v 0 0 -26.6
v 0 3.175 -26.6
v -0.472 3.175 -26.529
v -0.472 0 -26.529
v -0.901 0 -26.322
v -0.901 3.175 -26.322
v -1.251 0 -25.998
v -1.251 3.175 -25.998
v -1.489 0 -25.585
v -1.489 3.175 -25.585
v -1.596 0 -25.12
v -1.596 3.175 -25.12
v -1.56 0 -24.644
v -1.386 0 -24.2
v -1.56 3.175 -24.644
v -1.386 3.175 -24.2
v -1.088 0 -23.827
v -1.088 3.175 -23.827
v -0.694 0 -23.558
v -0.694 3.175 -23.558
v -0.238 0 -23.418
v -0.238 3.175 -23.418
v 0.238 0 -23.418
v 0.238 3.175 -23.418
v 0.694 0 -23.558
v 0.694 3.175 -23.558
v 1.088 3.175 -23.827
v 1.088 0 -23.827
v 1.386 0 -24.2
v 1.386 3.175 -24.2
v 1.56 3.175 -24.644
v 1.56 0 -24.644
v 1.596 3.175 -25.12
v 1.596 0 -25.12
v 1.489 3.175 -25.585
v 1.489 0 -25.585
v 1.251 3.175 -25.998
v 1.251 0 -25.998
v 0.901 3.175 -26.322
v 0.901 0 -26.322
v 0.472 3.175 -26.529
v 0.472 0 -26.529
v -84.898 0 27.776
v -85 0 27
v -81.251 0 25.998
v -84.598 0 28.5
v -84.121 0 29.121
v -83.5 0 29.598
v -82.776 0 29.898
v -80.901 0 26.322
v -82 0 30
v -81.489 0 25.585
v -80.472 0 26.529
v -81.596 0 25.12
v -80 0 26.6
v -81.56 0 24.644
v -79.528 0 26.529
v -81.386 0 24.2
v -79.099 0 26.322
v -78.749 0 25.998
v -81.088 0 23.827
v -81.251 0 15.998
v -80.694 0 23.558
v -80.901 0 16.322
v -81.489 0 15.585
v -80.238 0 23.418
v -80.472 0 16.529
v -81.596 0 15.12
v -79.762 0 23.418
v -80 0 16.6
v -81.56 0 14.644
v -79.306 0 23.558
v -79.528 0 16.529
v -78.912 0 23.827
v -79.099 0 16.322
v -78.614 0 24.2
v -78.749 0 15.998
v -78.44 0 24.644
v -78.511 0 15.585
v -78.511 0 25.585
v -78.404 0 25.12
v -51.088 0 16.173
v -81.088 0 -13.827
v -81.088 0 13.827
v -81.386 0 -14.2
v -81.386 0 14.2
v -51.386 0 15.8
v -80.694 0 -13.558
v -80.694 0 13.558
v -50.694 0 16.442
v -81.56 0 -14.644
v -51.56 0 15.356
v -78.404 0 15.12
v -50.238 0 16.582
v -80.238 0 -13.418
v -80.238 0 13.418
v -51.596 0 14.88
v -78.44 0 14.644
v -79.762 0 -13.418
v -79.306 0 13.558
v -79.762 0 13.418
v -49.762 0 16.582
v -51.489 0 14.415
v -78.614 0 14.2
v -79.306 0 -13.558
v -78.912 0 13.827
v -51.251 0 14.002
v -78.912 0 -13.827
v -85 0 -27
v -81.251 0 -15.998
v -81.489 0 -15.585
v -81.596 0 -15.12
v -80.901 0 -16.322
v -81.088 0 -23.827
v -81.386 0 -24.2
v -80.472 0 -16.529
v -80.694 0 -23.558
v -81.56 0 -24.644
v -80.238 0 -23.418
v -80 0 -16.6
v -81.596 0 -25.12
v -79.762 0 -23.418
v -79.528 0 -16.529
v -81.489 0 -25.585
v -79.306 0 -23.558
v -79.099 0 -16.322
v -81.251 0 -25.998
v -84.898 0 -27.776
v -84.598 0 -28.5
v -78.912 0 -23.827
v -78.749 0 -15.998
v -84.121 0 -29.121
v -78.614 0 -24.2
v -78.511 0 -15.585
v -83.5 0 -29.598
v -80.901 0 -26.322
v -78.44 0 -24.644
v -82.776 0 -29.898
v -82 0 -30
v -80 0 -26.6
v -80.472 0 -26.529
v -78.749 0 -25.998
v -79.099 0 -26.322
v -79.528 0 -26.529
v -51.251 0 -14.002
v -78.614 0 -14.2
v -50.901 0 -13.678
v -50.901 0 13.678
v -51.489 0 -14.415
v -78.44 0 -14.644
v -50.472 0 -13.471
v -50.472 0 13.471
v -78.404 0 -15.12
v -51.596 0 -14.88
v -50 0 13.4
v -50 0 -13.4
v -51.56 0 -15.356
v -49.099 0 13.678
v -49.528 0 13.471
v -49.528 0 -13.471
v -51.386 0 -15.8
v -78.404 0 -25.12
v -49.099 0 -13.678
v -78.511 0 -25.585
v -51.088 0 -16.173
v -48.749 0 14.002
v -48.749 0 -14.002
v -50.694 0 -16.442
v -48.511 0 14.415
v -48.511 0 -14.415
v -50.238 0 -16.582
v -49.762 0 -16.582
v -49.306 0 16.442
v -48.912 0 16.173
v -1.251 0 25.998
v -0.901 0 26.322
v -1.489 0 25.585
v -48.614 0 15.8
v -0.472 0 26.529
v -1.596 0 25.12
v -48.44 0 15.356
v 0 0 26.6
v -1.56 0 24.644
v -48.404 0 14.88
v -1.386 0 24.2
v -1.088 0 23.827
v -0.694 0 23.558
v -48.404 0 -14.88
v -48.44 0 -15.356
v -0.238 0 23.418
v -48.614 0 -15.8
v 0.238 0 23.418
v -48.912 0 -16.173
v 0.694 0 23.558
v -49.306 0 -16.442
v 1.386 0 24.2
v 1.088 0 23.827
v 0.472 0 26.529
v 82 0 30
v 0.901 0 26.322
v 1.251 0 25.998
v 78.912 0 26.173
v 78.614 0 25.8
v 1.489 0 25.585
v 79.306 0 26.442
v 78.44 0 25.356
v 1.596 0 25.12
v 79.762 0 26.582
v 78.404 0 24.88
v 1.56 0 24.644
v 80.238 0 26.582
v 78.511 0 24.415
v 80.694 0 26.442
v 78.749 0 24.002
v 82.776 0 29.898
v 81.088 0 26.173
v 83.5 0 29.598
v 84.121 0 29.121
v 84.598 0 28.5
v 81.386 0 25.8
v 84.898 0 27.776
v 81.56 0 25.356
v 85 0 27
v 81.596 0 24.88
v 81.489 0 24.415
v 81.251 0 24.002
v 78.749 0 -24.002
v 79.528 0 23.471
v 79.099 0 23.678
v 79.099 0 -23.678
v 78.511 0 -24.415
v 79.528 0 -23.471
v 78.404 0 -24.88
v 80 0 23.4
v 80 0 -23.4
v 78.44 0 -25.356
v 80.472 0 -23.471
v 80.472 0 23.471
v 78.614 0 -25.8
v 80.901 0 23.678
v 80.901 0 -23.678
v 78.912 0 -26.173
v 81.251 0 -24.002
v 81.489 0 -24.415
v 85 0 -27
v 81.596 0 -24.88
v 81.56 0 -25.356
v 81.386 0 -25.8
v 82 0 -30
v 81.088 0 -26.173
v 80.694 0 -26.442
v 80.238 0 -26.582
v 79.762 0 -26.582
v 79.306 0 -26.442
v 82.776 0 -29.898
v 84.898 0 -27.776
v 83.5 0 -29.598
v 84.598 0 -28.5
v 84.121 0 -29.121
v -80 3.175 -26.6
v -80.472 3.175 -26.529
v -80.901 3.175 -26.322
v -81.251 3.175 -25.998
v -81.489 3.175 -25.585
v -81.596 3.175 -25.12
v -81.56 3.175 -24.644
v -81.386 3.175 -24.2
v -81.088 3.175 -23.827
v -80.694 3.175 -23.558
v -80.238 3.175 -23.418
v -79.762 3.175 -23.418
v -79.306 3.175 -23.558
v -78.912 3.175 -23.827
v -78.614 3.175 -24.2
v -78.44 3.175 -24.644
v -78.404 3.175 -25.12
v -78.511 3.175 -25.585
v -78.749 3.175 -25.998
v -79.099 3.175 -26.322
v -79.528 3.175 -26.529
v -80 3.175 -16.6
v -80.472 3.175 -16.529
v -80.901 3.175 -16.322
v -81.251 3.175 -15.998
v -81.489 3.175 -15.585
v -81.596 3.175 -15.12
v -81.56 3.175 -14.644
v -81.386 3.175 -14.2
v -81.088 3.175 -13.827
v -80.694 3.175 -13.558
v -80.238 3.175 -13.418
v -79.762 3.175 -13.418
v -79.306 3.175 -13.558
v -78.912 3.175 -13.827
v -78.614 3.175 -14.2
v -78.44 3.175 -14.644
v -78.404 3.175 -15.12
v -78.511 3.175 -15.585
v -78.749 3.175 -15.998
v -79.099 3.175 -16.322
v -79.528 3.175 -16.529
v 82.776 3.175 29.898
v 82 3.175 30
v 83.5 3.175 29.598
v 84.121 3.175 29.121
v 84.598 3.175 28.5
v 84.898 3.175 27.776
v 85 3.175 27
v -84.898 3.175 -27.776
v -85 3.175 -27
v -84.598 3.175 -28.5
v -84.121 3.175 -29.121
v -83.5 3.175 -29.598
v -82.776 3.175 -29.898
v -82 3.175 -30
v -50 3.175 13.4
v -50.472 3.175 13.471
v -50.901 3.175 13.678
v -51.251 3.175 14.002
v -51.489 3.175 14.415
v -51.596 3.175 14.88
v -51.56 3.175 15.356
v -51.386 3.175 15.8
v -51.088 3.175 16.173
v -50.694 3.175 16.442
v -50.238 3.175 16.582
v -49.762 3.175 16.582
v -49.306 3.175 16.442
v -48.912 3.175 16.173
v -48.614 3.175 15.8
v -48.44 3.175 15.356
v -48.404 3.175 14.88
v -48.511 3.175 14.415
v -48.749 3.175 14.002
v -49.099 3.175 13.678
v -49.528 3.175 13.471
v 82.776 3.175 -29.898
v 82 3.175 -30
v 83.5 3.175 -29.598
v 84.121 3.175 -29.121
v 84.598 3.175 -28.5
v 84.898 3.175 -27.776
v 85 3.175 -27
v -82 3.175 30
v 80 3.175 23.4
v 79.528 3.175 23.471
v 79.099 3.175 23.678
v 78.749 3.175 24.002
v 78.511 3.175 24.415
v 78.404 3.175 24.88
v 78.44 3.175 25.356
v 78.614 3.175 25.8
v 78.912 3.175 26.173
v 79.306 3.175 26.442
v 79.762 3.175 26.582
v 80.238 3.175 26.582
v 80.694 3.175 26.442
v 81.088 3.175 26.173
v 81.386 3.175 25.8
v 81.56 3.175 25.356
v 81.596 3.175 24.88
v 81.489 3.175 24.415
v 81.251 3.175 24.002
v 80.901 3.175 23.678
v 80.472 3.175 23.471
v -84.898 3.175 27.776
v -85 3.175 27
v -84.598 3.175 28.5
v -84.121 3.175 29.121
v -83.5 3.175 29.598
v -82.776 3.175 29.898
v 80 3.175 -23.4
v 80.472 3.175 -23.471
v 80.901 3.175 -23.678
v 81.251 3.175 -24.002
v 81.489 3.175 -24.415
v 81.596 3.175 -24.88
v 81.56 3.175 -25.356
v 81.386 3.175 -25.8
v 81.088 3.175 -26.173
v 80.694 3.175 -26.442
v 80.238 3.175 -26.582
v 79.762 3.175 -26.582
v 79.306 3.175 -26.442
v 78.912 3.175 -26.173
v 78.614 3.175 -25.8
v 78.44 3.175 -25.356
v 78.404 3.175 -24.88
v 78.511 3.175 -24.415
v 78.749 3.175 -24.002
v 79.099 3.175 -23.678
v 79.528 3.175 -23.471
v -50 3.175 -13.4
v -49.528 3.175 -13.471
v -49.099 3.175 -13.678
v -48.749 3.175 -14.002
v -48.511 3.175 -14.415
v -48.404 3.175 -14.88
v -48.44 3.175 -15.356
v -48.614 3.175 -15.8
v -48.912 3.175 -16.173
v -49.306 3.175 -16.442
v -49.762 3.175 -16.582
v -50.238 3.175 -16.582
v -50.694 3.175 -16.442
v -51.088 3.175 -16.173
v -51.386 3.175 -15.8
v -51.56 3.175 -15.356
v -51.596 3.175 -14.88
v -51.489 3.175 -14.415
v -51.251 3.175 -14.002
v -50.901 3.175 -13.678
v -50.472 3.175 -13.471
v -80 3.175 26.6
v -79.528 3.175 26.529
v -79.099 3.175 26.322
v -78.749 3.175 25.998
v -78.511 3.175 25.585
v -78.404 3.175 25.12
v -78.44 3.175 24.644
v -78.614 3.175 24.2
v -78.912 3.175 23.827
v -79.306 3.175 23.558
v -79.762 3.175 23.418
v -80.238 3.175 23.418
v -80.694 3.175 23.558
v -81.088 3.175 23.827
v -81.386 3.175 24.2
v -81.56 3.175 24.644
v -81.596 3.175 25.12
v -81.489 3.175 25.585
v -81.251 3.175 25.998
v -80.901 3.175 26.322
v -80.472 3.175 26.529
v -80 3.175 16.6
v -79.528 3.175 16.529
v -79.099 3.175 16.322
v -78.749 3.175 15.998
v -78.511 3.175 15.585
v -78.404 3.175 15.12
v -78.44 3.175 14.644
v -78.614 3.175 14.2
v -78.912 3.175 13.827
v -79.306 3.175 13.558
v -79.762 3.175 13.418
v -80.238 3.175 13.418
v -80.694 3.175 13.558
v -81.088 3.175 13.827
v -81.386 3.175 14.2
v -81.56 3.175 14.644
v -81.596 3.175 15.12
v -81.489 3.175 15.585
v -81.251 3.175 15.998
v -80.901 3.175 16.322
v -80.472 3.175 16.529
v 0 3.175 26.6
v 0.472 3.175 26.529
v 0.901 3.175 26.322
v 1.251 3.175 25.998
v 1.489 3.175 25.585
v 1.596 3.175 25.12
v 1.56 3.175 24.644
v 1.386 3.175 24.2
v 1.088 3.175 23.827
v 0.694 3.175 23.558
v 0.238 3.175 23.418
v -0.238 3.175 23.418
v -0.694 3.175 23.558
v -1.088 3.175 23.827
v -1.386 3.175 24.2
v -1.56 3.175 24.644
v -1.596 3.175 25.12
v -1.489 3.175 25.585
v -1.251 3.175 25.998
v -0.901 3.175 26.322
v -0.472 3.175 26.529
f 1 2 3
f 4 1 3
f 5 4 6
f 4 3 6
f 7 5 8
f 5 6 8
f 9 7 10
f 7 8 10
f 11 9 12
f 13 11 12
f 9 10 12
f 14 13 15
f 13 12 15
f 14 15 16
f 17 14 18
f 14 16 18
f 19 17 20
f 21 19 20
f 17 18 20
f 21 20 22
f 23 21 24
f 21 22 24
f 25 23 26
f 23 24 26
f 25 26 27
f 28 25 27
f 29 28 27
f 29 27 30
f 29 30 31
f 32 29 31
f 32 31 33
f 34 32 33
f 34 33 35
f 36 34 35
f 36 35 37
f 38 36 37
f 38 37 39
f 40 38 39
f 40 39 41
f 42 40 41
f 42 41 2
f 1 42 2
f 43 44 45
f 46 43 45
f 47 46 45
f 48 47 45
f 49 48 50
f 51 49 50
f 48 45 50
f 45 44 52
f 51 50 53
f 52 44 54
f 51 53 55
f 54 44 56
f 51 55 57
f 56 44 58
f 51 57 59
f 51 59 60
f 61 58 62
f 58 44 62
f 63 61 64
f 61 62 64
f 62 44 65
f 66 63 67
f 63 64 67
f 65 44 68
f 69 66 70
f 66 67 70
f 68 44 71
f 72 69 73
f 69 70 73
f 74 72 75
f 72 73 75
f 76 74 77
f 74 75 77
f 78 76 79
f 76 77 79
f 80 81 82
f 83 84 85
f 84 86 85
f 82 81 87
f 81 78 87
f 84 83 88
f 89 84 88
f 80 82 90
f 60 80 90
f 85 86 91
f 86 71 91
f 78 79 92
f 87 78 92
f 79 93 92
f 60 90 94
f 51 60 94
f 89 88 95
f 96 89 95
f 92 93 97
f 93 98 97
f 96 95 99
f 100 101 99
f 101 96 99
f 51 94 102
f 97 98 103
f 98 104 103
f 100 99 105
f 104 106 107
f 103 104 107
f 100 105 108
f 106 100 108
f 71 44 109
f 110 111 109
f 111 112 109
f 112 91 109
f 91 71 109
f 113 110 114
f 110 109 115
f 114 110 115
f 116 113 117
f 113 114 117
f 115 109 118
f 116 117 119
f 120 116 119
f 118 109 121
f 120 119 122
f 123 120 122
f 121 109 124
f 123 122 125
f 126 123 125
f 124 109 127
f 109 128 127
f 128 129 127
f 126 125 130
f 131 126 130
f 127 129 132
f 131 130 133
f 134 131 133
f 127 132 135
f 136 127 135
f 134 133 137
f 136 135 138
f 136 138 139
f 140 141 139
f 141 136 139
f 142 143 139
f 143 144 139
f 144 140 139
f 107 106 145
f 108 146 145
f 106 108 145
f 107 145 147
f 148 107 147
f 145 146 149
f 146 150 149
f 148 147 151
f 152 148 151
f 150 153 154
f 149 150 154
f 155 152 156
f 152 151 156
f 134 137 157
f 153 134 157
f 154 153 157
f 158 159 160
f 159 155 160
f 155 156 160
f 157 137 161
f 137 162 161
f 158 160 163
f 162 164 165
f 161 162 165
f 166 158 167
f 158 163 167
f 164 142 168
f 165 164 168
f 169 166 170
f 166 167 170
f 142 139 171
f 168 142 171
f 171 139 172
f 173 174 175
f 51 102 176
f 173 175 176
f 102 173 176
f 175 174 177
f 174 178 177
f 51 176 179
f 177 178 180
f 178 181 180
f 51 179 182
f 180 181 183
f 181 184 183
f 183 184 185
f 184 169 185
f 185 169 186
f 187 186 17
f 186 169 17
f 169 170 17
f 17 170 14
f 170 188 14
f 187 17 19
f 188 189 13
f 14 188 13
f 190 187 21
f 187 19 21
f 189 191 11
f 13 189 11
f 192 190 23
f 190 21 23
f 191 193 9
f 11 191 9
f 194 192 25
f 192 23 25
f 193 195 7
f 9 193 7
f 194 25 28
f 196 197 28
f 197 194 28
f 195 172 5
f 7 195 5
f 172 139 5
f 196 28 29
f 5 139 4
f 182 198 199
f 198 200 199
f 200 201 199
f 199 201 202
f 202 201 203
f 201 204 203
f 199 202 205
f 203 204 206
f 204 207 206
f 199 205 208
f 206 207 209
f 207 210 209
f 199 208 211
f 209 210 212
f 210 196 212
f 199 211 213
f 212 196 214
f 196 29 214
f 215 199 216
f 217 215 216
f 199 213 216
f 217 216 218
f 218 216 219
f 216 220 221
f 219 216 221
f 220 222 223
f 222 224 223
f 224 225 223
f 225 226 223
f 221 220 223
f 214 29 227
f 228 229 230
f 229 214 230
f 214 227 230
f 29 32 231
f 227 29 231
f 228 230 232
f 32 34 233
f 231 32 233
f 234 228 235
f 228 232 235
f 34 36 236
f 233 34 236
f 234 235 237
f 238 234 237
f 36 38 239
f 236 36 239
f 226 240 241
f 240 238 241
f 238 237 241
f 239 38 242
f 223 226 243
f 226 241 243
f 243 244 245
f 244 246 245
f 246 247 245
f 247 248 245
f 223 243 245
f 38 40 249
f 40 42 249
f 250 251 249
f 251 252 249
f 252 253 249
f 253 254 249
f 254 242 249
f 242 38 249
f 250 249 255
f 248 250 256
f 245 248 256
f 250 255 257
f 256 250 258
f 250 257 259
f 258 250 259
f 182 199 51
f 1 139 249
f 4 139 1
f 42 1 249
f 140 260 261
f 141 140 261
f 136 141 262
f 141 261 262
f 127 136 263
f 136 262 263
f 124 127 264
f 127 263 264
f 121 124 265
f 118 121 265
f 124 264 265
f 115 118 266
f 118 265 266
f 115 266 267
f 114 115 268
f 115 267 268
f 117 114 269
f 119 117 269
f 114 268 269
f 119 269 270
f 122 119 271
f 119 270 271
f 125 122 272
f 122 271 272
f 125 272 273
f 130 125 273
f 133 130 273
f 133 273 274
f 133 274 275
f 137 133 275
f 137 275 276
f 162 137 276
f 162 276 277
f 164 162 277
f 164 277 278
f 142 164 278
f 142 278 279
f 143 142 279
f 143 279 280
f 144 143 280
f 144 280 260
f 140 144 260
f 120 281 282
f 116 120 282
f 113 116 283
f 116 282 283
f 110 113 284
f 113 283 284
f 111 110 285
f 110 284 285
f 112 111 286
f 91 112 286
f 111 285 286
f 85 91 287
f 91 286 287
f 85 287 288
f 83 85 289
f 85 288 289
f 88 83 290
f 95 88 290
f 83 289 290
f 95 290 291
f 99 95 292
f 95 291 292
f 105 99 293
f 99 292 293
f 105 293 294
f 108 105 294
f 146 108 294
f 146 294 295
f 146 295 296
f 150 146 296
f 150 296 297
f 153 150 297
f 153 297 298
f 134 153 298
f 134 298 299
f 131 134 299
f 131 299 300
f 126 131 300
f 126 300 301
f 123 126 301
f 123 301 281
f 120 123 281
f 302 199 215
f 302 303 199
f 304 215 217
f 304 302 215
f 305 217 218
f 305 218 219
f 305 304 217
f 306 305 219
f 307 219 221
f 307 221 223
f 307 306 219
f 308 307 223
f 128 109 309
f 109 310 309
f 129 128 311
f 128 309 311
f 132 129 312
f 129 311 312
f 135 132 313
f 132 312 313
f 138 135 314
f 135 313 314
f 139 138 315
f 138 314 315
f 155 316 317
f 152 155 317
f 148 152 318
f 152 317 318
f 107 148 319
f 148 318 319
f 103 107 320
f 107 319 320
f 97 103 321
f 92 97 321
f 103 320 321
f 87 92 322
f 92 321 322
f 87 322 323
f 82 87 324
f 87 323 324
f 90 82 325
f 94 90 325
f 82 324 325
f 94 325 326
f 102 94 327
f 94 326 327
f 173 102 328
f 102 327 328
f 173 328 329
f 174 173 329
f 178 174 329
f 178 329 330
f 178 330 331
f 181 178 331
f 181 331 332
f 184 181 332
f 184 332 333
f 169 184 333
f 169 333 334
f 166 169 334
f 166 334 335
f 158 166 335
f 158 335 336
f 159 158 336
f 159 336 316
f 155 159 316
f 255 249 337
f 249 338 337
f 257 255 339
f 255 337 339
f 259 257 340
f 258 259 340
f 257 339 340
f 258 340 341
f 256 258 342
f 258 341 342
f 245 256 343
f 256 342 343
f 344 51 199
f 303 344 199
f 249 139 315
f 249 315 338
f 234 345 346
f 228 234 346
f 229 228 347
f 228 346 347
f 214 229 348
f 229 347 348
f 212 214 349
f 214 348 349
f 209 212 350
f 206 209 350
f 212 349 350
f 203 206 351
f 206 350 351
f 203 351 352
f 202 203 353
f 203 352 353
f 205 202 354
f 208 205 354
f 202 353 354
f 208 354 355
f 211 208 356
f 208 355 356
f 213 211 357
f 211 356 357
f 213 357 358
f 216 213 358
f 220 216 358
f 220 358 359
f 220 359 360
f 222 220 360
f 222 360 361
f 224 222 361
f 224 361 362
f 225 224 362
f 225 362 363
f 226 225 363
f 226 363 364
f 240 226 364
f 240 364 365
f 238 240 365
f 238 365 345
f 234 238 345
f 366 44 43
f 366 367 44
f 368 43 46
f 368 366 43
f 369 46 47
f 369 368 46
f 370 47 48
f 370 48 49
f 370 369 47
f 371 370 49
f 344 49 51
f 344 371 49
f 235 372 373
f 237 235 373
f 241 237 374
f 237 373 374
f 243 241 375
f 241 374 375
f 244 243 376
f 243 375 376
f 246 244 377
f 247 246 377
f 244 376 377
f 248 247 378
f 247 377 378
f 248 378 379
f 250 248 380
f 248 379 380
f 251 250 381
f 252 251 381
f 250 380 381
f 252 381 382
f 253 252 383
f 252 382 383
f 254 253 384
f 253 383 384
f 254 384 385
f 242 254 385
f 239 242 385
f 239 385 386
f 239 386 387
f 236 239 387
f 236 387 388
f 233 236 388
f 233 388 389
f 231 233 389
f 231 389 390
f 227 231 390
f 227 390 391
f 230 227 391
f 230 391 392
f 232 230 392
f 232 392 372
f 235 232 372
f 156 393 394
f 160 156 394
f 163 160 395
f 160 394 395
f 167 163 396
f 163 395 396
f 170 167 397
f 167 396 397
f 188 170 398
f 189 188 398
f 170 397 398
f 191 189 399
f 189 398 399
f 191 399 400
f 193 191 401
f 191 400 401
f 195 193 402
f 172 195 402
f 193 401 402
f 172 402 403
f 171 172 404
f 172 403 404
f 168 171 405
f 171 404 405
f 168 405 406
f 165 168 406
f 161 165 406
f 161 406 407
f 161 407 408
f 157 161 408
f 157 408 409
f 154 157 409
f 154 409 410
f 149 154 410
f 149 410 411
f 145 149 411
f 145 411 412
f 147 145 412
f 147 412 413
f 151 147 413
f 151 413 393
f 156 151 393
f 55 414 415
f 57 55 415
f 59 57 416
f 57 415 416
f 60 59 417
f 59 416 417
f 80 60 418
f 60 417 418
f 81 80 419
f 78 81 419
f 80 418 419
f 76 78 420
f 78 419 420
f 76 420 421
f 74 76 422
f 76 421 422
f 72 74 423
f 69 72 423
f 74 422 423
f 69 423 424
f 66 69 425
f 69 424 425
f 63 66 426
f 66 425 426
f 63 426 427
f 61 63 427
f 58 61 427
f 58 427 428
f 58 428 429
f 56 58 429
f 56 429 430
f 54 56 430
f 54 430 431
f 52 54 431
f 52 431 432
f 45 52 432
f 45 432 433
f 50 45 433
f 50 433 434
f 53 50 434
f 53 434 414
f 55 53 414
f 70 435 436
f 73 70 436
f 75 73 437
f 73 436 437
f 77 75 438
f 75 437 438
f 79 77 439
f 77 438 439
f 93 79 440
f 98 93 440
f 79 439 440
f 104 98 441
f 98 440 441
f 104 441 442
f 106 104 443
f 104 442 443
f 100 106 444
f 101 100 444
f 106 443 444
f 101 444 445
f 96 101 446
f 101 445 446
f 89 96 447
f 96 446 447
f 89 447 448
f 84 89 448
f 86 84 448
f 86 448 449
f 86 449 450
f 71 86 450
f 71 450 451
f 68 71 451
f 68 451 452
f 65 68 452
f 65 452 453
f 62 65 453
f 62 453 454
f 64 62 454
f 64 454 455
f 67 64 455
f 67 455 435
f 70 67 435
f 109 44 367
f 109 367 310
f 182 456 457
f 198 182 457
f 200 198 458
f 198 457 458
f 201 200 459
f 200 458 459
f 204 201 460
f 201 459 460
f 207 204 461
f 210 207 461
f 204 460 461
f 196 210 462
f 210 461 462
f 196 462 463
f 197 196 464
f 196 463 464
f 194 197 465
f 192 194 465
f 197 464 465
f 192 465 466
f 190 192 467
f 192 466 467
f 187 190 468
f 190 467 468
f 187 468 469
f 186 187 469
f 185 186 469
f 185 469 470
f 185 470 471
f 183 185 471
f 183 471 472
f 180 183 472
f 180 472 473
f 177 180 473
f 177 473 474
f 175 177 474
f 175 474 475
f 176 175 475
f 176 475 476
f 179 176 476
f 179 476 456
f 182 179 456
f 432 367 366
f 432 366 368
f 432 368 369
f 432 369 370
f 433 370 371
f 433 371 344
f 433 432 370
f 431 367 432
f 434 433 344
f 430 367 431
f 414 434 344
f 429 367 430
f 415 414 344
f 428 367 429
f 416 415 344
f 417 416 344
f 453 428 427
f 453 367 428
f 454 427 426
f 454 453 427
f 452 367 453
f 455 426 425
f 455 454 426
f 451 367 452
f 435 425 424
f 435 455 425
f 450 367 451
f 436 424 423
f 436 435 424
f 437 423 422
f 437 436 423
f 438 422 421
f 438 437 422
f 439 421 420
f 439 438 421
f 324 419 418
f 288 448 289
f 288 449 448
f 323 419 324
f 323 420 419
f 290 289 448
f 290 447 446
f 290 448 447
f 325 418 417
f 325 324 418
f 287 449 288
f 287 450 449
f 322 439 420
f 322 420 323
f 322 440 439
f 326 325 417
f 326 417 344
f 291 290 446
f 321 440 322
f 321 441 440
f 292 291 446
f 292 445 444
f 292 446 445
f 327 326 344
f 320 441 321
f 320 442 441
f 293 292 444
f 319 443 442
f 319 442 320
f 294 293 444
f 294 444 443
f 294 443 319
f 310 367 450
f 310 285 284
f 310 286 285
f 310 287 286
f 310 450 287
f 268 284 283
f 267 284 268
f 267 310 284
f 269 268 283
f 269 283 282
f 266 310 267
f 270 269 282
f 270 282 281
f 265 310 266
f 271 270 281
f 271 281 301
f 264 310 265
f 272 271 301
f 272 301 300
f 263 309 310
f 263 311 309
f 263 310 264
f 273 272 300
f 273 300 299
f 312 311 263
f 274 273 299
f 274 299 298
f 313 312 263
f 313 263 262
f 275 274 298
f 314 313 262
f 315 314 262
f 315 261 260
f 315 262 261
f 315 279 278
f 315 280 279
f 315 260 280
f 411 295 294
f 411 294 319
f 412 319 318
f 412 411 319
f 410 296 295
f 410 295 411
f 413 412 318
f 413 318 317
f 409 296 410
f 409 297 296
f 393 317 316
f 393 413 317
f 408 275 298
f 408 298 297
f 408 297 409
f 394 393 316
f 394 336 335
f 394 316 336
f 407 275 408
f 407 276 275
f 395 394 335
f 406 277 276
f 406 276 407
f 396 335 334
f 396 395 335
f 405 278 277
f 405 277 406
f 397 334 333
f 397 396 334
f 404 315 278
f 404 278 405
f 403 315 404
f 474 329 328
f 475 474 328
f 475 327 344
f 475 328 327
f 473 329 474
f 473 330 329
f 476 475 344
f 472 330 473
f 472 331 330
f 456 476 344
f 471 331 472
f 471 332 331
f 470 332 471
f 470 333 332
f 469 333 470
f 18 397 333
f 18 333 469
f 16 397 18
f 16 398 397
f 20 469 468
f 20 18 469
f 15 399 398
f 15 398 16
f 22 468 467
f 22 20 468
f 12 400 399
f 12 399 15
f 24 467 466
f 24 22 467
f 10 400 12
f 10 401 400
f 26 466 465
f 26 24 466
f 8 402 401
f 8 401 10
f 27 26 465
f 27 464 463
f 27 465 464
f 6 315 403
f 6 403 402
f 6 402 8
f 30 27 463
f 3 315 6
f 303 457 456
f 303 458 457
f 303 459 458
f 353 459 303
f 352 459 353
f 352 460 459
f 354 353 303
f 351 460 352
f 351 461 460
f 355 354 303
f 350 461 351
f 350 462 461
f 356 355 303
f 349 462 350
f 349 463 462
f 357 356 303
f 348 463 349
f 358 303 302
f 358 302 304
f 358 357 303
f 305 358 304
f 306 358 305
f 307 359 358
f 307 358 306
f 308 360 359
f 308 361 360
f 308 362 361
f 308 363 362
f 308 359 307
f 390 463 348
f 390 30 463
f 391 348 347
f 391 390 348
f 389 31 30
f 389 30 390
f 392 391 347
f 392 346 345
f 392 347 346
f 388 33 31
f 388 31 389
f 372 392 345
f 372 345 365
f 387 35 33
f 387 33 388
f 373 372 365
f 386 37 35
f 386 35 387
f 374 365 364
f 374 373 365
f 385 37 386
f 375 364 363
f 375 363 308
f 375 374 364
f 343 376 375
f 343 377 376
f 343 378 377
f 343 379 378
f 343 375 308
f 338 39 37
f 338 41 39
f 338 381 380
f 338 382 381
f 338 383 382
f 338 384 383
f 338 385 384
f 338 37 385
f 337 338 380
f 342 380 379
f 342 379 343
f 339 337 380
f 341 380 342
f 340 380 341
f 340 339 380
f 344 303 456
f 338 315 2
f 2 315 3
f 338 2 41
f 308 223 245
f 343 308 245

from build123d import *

# Parameters (mm, degrees)
SKETCH1_W           = 170
SKETCH1_H           = 60
BOSS_EXTRUDE1_DEPTH = 3.175
SKETCH2_R           = 1.6
CUT_EXTRUDE1_DEPTH  = 91.1946818
SKETCH3_R           = 1.6
CUT_EXTRUDE2_DEPTH  = 91.1946818
FILLET1_R           = 3


with BuildPart() as part:
    # Sketch1 → Boss-Extrude1 (new body)
    with BuildSketch(Plane(origin=(0, 0, 0), x_dir=(1, 0, 0), z_dir=(0, 1, 0))):
        Rectangle(SKETCH1_W, SKETCH1_H)
    extrude(amount=BOSS_EXTRUDE1_DEPTH)

    # Sketch2 → Cut-Extrude1 (cut, through all)
    with BuildSketch(Plane(origin=(0, 3.175, 0), x_dir=(1, 0, 0), z_dir=(0, 1, 0))):
        with Locations(Location((-80, -25, 0), (0, 0, 270))):
            Circle(SKETCH2_R)
        with Locations(Location((-80, 25, 0), (0, 0, 90))):
            Circle(SKETCH2_R)
        with Locations(Location((80, 25, 0), (0, 0, 270))):
            Circle(SKETCH2_R)
        with Locations(Location((80, -25, 0), (0, 0, 90))):
            Circle(SKETCH2_R)
        with Locations(Location((0, -25, 0), (0, 0, 270))):
            Circle(SKETCH2_R)
        with Locations(Location((0, 25, 0), (0, 0, 90))):
            Circle(SKETCH2_R)
    extrude(amount=-CUT_EXTRUDE1_DEPTH, mode=Mode.SUBTRACT)

    # Sketch3 → Cut-Extrude2 (cut, through all)
    with BuildSketch(Plane(origin=(0, 3.175, 0), x_dir=(1, 0, 0), z_dir=(0, 1, 0))):
        with Locations(Location((-80, -15, 0), (0, 0, 270))):
            Circle(SKETCH3_R)
        with Locations(Location((-80, 15, 0), (0, 0, 90))):
            Circle(SKETCH3_R)
        with Locations(Location((-50, 15, 0), (0, 0, 270))):
            Circle(SKETCH3_R)
        with Locations(Location((-50, -15, 0), (0, 0, 90))):
            Circle(SKETCH3_R)
    extrude(amount=-CUT_EXTRUDE2_DEPTH, mode=Mode.SUBTRACT)

    # Fillet1
    fillet1_edges = [part.edges().sort_by_distance(p)[0] for p in [
        (85, 1.5875, 30),
        (-85, 1.5875, 30),
        (-85, 1.5875, -30),
        (85, 1.5875, -30),
    ]]
    fillet(fillet1_edges, radius=FILLET1_R)


solid = part.part
